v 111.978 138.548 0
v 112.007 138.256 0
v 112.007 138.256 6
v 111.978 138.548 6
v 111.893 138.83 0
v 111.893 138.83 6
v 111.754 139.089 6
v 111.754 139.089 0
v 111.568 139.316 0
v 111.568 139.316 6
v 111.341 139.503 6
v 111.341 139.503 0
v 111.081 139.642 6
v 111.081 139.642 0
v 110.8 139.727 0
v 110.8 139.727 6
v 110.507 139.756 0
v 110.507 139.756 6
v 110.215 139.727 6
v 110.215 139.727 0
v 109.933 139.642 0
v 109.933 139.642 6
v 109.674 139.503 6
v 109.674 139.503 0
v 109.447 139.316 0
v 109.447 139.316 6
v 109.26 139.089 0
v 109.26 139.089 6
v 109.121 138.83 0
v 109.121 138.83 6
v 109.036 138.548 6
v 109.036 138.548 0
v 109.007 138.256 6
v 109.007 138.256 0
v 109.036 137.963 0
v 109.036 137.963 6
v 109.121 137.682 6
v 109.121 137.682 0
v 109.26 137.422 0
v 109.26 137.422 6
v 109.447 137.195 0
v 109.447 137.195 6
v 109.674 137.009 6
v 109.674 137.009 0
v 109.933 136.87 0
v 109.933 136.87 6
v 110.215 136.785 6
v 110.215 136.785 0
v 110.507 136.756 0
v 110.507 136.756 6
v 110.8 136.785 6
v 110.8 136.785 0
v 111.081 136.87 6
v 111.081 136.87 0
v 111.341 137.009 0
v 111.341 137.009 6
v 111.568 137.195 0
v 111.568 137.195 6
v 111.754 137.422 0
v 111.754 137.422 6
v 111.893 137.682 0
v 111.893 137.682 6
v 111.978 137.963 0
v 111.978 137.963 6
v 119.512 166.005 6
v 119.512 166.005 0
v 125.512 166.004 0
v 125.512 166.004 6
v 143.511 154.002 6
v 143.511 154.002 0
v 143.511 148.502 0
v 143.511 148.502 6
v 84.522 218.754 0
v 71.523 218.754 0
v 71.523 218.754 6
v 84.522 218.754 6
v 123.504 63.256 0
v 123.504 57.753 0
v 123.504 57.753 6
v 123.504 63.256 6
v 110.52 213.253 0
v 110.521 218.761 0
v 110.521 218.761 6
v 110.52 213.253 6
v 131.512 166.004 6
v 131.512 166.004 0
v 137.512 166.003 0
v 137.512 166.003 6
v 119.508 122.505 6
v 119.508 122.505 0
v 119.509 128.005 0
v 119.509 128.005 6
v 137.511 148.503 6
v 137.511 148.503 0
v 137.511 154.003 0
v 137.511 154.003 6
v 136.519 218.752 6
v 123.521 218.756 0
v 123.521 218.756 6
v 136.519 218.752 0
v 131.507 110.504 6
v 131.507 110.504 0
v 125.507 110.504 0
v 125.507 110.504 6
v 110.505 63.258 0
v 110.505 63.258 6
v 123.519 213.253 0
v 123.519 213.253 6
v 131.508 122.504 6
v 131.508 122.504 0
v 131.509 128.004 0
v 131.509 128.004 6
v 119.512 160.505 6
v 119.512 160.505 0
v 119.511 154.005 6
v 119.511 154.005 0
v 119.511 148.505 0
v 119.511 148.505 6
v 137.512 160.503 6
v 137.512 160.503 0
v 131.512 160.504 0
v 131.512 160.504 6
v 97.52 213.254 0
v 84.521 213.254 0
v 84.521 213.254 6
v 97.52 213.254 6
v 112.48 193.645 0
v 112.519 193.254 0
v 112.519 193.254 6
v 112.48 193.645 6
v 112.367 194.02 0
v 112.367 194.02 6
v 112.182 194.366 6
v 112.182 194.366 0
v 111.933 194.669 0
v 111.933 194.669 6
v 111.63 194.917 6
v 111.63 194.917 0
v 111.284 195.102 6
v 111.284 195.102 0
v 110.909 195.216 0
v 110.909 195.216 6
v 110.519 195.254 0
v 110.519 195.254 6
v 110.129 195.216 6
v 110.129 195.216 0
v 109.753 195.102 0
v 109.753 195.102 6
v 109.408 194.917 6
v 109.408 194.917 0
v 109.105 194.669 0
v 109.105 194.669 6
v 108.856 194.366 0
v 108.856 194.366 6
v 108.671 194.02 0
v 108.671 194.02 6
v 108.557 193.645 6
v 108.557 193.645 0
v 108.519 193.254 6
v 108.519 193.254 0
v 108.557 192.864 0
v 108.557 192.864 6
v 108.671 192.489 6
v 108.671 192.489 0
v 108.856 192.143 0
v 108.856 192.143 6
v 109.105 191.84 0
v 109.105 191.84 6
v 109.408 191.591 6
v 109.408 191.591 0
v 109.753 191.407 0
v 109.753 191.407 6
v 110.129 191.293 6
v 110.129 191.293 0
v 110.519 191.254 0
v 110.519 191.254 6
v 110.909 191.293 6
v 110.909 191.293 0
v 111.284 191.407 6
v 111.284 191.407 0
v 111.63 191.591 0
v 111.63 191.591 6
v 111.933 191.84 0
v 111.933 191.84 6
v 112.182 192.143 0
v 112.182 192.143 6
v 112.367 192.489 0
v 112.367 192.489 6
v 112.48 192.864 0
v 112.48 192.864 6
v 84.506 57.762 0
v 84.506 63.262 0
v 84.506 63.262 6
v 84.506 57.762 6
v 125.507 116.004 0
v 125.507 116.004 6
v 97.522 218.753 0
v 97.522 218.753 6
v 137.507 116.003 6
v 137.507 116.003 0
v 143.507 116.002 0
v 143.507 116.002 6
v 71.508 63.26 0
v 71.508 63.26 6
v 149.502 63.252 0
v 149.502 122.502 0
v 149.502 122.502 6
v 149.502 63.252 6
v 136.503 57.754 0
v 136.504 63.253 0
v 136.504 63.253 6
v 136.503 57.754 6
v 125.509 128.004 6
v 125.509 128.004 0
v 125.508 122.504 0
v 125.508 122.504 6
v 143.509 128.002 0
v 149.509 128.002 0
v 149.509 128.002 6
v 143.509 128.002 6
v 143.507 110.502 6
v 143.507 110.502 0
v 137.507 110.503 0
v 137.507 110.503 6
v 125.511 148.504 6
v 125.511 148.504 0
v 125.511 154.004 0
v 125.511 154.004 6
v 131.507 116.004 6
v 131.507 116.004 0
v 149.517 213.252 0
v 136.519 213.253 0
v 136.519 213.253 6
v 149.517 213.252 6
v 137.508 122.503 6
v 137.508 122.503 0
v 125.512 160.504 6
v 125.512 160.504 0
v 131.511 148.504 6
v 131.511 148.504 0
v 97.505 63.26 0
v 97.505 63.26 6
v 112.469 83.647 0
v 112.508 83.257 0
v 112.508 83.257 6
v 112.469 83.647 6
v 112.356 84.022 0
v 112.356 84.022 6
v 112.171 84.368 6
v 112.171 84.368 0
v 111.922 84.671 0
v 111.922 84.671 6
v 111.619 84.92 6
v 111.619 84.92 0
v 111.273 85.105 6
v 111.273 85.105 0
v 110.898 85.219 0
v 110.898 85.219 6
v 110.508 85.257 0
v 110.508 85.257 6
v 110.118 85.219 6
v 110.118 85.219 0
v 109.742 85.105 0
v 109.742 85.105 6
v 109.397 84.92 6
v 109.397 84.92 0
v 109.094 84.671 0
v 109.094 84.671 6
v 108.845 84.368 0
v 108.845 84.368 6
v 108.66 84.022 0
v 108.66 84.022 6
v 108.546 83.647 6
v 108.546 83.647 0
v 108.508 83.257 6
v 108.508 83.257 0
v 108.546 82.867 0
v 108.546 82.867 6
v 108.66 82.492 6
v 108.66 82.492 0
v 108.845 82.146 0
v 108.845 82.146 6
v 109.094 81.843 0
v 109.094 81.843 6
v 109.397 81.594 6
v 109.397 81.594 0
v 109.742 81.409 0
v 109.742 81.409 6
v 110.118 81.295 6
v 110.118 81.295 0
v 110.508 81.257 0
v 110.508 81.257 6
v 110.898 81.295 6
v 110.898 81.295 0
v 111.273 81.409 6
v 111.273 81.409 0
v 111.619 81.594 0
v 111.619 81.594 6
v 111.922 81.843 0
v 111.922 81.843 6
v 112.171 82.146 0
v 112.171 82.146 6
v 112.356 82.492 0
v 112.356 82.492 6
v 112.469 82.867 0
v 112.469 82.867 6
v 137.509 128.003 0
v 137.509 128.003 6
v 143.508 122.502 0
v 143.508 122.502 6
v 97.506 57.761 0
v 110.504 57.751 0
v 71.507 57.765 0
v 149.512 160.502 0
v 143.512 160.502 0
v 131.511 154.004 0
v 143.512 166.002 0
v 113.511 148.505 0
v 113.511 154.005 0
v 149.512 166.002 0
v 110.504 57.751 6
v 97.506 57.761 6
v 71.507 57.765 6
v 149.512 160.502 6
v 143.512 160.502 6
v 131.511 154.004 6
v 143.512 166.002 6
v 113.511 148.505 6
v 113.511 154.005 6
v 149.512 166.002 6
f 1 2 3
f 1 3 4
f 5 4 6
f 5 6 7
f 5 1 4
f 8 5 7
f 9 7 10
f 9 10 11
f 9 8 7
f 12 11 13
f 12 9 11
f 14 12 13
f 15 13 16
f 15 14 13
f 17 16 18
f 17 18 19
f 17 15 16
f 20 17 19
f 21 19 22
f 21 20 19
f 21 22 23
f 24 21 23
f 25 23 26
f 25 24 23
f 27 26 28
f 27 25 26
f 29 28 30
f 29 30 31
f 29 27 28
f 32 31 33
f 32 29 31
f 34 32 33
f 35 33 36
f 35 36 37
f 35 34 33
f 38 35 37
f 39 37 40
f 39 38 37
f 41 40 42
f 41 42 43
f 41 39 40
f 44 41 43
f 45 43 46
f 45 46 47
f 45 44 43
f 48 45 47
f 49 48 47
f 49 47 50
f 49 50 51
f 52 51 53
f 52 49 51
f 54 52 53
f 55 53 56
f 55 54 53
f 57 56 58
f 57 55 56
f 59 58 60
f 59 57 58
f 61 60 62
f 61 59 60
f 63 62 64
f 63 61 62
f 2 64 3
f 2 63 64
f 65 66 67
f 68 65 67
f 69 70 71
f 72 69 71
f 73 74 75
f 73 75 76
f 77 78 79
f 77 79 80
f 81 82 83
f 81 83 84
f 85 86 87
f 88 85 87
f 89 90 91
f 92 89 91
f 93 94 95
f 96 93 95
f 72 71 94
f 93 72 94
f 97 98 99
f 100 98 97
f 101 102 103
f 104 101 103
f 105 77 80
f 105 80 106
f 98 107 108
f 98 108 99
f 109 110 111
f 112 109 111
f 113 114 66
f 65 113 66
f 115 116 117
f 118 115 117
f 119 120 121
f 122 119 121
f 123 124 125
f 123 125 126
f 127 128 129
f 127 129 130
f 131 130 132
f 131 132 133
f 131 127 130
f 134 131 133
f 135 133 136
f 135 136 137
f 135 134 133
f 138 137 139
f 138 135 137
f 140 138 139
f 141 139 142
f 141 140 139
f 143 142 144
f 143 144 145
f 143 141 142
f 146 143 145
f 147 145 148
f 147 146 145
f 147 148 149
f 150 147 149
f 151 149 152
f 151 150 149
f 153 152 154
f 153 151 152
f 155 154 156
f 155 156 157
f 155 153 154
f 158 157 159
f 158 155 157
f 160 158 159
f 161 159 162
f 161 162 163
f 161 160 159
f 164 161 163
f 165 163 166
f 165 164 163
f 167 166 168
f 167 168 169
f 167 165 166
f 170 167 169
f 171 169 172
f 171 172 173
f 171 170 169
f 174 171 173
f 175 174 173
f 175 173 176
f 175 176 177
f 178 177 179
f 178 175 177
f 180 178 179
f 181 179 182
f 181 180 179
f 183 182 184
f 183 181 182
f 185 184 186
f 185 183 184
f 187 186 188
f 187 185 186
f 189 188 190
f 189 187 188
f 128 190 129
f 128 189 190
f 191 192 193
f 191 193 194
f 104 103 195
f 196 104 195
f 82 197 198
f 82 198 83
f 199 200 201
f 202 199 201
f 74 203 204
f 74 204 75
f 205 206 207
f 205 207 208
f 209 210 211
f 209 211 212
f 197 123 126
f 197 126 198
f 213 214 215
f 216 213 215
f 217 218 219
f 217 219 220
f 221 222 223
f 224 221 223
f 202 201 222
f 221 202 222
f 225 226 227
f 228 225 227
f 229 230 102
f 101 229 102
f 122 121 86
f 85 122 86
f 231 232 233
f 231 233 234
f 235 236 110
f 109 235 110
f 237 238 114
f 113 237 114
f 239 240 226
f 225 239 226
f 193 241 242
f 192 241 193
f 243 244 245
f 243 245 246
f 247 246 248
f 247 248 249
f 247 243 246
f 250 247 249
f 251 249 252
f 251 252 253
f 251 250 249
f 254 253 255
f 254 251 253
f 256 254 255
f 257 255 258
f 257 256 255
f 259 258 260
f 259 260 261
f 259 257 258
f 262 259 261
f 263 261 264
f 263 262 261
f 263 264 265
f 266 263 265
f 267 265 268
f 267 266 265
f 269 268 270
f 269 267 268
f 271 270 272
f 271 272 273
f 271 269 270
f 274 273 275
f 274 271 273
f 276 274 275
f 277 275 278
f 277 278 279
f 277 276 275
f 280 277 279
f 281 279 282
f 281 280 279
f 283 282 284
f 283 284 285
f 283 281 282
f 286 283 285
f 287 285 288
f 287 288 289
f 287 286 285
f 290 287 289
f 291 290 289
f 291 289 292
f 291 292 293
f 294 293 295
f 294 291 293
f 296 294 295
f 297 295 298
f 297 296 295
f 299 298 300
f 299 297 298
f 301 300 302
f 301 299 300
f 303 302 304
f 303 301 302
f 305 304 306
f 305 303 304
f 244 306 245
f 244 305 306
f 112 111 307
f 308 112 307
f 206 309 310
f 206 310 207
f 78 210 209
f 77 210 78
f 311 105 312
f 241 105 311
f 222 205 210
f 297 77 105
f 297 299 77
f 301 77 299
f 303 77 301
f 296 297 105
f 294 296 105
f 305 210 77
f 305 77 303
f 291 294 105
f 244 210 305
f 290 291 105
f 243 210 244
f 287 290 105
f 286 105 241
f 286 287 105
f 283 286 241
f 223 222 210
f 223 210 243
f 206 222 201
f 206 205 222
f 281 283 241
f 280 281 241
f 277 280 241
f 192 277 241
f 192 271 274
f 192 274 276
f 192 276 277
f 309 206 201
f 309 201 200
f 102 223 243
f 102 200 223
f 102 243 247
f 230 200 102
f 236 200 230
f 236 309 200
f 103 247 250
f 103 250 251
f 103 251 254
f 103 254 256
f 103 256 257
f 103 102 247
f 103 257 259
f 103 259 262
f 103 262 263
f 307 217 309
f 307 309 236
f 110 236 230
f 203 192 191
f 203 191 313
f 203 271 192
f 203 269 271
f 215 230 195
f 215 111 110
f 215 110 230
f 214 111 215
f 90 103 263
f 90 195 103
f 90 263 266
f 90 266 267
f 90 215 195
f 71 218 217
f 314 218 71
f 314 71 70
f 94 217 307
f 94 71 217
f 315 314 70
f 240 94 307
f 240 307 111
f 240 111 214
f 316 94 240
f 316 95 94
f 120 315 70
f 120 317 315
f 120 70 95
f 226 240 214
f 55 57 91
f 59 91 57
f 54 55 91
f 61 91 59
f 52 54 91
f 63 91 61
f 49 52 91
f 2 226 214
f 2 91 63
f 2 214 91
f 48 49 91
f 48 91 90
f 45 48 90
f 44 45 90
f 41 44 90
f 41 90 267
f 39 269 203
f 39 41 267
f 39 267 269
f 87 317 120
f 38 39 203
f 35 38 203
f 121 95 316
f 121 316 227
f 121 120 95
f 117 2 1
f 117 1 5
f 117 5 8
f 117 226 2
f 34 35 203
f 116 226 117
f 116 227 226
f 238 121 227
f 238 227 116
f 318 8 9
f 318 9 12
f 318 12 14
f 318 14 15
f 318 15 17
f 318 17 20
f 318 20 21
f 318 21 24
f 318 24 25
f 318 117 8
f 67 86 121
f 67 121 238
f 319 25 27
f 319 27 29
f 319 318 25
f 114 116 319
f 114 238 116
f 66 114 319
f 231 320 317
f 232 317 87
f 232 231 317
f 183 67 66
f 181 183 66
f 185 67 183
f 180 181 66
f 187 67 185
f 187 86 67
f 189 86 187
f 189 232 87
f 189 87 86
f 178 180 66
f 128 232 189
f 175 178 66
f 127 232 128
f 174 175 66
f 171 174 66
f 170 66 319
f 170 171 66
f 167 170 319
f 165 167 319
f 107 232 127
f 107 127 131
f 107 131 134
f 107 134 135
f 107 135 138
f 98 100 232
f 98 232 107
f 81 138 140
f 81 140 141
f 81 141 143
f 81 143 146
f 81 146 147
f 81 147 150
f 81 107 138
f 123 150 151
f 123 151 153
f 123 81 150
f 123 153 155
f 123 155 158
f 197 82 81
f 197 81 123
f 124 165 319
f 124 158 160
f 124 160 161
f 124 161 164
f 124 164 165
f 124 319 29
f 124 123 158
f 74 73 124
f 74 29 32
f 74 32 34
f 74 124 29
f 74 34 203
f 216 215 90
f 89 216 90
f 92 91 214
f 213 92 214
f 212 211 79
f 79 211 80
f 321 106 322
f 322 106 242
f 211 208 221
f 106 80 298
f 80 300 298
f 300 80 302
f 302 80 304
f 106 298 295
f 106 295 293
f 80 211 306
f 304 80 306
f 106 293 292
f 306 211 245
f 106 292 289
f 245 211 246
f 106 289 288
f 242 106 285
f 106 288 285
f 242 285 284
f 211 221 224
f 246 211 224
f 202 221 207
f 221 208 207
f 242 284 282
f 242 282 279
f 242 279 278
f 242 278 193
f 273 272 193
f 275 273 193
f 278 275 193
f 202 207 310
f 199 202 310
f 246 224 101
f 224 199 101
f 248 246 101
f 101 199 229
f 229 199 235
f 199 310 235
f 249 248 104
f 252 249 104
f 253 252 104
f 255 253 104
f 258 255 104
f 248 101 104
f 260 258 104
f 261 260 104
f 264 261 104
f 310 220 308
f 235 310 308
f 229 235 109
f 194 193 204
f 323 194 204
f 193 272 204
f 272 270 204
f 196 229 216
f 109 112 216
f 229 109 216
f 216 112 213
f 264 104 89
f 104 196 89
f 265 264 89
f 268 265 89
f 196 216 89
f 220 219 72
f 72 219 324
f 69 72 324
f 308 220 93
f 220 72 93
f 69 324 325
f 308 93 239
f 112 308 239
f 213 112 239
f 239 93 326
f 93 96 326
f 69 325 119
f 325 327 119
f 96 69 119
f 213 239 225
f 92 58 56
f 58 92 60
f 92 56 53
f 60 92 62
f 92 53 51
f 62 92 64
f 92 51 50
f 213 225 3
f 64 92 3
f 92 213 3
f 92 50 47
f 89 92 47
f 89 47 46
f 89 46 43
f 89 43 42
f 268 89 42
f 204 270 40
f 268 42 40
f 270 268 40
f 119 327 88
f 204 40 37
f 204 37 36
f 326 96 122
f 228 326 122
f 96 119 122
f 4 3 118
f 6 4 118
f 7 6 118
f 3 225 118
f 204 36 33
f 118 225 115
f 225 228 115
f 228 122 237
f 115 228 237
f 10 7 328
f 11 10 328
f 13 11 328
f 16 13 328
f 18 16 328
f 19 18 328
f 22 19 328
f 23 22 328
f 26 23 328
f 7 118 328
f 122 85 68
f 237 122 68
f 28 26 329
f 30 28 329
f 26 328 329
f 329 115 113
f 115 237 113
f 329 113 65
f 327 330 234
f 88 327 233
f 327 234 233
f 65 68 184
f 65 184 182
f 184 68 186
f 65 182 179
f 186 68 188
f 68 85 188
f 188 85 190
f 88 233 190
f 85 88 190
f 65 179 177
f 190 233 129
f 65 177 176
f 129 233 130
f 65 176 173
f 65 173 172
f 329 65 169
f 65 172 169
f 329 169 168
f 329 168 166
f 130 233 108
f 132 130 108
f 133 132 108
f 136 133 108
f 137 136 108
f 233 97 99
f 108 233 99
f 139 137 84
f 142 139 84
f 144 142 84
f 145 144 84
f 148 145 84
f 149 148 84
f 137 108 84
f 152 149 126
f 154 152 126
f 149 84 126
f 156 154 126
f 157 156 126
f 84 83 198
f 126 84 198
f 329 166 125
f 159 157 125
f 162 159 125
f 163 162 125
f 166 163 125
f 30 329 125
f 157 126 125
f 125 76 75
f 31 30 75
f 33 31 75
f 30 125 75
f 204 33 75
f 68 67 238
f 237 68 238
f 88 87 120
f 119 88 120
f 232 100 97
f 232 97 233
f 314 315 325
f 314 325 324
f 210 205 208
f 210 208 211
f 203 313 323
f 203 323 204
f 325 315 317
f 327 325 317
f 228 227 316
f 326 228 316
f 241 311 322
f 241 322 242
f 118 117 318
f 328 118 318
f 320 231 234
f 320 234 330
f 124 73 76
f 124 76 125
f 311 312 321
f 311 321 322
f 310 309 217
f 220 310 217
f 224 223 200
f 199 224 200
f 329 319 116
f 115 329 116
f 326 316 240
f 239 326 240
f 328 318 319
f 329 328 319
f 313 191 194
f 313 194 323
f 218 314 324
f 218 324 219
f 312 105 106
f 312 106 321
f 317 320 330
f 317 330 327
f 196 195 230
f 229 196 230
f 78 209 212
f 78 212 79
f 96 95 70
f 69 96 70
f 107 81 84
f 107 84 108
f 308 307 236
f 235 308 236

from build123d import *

# Parameters (mm, degrees)
MODEL_R             = 2
MODEL_R_2           = 1.5
BOSS_EXTRUDE1_DEPTH = 6


with BuildPart() as part:
    # Model → Boss-Extrude1 (new body)
    with BuildSketch(Plane.XY):
        Polygon((136.503533409, 63.253129949), (136.50298126, 57.754435229), (123.504343338, 57.752522637), (123.503533606, 63.255740591), (110.504895018, 63.258351095), (110.504341961, 57.750609844), (97.50570415, 57.760961628), (97.504895084, 63.259656484), (84.506256496, 63.262266989), (84.505704216, 57.762267017), (71.507065628, 57.764877521), (71.508169139, 63.259656429), (71.52323132, 218.754434691), (84.52187017, 218.754434691), (84.52131789, 213.254434719), (97.51995674, 213.254434719), (97.521870105, 218.753129302), (110.520509732, 218.760870582), (110.519956675, 213.25312933), (123.518595525, 213.25312933), (123.520510463, 218.75634701), (136.519147739, 218.751823913), (136.51859559, 213.253129193), (149.517234309, 213.251823941), (149.512489722, 166.001824179), (143.512489752, 166.002426666), (143.512213612, 163.25242668), (143.511937472, 160.502426694), (149.511937442, 160.501824207), (149.50867397, 128.001824371), (143.508674, 128.002426858), (143.50839786, 125.252426872), (143.50812172, 122.502426886), (149.502172128, 122.501824996), (149.502172128, 63.251824697), align=None)
        with Locations((110.507816209, 83.257045523)):
            Circle(MODEL_R, mode=Mode.SUBTRACT)
        with Locations((110.518861547, 193.254434719)):
            Circle(MODEL_R, mode=Mode.SUBTRACT)
        with Locations((110.507264687, 138.255740731)):
            Circle(MODEL_R_2, mode=Mode.SUBTRACT)
        Polygon((119.512213733, 163.254836629), (119.512489873, 166.004836615), (125.512489843, 166.004234128), (125.511937563, 160.504234156), (119.511937593, 160.504836643), align=None, mode=Mode.SUBTRACT)
        Polygon((131.512213673, 163.253631655), (131.512489813, 166.003631641), (137.512489783, 166.003029154), (137.511937503, 160.503029181), (131.511937533, 160.503631669), align=None, mode=Mode.SUBTRACT)
        Polygon((113.511008789, 151.255439177), (113.511284929, 154.005439163), (119.511284899, 154.004836676), (119.510732619, 148.504836703), (113.510732649, 148.505439191), align=None, mode=Mode.SUBTRACT)
        Polygon((125.511008729, 151.254234202), (125.511284869, 154.004234189), (131.511284838, 154.003631701), (131.510732558, 148.503631729), (125.510732589, 148.504234216), align=None, mode=Mode.SUBTRACT)
        Polygon((137.511008668, 151.253029228), (137.511284808, 154.003029214), (143.511284778, 154.002426727), (143.510732498, 148.502426755), (137.510732528, 148.503029242), align=None, mode=Mode.SUBTRACT)
        Polygon((119.508397981, 125.254836821), (119.508674121, 128.004836807), (125.508674091, 128.00423432), (125.508121811, 122.504234347), (119.508121841, 122.504836835), align=None, mode=Mode.SUBTRACT)
        Polygon((131.50839792, 125.253631846), (131.50867406, 128.003631832), (137.50867403, 128.003029345), (137.50812175, 122.503029373), (131.50812178, 122.50363186), align=None, mode=Mode.SUBTRACT)
        Polygon((125.507192976, 113.254234394), (125.507469116, 116.00423438), (131.507469086, 116.003631893), (131.506916806, 110.503631921), (125.506916836, 110.504234408), align=None, mode=Mode.SUBTRACT)
        Polygon((137.507192916, 113.253029419), (137.507469056, 116.003029406), (143.507469025, 116.002426918), (143.506916745, 110.502426946), (137.506916776, 110.503029433), align=None, mode=Mode.SUBTRACT)
    extrude(amount=BOSS_EXTRUDE1_DEPTH)


solid = part.part
